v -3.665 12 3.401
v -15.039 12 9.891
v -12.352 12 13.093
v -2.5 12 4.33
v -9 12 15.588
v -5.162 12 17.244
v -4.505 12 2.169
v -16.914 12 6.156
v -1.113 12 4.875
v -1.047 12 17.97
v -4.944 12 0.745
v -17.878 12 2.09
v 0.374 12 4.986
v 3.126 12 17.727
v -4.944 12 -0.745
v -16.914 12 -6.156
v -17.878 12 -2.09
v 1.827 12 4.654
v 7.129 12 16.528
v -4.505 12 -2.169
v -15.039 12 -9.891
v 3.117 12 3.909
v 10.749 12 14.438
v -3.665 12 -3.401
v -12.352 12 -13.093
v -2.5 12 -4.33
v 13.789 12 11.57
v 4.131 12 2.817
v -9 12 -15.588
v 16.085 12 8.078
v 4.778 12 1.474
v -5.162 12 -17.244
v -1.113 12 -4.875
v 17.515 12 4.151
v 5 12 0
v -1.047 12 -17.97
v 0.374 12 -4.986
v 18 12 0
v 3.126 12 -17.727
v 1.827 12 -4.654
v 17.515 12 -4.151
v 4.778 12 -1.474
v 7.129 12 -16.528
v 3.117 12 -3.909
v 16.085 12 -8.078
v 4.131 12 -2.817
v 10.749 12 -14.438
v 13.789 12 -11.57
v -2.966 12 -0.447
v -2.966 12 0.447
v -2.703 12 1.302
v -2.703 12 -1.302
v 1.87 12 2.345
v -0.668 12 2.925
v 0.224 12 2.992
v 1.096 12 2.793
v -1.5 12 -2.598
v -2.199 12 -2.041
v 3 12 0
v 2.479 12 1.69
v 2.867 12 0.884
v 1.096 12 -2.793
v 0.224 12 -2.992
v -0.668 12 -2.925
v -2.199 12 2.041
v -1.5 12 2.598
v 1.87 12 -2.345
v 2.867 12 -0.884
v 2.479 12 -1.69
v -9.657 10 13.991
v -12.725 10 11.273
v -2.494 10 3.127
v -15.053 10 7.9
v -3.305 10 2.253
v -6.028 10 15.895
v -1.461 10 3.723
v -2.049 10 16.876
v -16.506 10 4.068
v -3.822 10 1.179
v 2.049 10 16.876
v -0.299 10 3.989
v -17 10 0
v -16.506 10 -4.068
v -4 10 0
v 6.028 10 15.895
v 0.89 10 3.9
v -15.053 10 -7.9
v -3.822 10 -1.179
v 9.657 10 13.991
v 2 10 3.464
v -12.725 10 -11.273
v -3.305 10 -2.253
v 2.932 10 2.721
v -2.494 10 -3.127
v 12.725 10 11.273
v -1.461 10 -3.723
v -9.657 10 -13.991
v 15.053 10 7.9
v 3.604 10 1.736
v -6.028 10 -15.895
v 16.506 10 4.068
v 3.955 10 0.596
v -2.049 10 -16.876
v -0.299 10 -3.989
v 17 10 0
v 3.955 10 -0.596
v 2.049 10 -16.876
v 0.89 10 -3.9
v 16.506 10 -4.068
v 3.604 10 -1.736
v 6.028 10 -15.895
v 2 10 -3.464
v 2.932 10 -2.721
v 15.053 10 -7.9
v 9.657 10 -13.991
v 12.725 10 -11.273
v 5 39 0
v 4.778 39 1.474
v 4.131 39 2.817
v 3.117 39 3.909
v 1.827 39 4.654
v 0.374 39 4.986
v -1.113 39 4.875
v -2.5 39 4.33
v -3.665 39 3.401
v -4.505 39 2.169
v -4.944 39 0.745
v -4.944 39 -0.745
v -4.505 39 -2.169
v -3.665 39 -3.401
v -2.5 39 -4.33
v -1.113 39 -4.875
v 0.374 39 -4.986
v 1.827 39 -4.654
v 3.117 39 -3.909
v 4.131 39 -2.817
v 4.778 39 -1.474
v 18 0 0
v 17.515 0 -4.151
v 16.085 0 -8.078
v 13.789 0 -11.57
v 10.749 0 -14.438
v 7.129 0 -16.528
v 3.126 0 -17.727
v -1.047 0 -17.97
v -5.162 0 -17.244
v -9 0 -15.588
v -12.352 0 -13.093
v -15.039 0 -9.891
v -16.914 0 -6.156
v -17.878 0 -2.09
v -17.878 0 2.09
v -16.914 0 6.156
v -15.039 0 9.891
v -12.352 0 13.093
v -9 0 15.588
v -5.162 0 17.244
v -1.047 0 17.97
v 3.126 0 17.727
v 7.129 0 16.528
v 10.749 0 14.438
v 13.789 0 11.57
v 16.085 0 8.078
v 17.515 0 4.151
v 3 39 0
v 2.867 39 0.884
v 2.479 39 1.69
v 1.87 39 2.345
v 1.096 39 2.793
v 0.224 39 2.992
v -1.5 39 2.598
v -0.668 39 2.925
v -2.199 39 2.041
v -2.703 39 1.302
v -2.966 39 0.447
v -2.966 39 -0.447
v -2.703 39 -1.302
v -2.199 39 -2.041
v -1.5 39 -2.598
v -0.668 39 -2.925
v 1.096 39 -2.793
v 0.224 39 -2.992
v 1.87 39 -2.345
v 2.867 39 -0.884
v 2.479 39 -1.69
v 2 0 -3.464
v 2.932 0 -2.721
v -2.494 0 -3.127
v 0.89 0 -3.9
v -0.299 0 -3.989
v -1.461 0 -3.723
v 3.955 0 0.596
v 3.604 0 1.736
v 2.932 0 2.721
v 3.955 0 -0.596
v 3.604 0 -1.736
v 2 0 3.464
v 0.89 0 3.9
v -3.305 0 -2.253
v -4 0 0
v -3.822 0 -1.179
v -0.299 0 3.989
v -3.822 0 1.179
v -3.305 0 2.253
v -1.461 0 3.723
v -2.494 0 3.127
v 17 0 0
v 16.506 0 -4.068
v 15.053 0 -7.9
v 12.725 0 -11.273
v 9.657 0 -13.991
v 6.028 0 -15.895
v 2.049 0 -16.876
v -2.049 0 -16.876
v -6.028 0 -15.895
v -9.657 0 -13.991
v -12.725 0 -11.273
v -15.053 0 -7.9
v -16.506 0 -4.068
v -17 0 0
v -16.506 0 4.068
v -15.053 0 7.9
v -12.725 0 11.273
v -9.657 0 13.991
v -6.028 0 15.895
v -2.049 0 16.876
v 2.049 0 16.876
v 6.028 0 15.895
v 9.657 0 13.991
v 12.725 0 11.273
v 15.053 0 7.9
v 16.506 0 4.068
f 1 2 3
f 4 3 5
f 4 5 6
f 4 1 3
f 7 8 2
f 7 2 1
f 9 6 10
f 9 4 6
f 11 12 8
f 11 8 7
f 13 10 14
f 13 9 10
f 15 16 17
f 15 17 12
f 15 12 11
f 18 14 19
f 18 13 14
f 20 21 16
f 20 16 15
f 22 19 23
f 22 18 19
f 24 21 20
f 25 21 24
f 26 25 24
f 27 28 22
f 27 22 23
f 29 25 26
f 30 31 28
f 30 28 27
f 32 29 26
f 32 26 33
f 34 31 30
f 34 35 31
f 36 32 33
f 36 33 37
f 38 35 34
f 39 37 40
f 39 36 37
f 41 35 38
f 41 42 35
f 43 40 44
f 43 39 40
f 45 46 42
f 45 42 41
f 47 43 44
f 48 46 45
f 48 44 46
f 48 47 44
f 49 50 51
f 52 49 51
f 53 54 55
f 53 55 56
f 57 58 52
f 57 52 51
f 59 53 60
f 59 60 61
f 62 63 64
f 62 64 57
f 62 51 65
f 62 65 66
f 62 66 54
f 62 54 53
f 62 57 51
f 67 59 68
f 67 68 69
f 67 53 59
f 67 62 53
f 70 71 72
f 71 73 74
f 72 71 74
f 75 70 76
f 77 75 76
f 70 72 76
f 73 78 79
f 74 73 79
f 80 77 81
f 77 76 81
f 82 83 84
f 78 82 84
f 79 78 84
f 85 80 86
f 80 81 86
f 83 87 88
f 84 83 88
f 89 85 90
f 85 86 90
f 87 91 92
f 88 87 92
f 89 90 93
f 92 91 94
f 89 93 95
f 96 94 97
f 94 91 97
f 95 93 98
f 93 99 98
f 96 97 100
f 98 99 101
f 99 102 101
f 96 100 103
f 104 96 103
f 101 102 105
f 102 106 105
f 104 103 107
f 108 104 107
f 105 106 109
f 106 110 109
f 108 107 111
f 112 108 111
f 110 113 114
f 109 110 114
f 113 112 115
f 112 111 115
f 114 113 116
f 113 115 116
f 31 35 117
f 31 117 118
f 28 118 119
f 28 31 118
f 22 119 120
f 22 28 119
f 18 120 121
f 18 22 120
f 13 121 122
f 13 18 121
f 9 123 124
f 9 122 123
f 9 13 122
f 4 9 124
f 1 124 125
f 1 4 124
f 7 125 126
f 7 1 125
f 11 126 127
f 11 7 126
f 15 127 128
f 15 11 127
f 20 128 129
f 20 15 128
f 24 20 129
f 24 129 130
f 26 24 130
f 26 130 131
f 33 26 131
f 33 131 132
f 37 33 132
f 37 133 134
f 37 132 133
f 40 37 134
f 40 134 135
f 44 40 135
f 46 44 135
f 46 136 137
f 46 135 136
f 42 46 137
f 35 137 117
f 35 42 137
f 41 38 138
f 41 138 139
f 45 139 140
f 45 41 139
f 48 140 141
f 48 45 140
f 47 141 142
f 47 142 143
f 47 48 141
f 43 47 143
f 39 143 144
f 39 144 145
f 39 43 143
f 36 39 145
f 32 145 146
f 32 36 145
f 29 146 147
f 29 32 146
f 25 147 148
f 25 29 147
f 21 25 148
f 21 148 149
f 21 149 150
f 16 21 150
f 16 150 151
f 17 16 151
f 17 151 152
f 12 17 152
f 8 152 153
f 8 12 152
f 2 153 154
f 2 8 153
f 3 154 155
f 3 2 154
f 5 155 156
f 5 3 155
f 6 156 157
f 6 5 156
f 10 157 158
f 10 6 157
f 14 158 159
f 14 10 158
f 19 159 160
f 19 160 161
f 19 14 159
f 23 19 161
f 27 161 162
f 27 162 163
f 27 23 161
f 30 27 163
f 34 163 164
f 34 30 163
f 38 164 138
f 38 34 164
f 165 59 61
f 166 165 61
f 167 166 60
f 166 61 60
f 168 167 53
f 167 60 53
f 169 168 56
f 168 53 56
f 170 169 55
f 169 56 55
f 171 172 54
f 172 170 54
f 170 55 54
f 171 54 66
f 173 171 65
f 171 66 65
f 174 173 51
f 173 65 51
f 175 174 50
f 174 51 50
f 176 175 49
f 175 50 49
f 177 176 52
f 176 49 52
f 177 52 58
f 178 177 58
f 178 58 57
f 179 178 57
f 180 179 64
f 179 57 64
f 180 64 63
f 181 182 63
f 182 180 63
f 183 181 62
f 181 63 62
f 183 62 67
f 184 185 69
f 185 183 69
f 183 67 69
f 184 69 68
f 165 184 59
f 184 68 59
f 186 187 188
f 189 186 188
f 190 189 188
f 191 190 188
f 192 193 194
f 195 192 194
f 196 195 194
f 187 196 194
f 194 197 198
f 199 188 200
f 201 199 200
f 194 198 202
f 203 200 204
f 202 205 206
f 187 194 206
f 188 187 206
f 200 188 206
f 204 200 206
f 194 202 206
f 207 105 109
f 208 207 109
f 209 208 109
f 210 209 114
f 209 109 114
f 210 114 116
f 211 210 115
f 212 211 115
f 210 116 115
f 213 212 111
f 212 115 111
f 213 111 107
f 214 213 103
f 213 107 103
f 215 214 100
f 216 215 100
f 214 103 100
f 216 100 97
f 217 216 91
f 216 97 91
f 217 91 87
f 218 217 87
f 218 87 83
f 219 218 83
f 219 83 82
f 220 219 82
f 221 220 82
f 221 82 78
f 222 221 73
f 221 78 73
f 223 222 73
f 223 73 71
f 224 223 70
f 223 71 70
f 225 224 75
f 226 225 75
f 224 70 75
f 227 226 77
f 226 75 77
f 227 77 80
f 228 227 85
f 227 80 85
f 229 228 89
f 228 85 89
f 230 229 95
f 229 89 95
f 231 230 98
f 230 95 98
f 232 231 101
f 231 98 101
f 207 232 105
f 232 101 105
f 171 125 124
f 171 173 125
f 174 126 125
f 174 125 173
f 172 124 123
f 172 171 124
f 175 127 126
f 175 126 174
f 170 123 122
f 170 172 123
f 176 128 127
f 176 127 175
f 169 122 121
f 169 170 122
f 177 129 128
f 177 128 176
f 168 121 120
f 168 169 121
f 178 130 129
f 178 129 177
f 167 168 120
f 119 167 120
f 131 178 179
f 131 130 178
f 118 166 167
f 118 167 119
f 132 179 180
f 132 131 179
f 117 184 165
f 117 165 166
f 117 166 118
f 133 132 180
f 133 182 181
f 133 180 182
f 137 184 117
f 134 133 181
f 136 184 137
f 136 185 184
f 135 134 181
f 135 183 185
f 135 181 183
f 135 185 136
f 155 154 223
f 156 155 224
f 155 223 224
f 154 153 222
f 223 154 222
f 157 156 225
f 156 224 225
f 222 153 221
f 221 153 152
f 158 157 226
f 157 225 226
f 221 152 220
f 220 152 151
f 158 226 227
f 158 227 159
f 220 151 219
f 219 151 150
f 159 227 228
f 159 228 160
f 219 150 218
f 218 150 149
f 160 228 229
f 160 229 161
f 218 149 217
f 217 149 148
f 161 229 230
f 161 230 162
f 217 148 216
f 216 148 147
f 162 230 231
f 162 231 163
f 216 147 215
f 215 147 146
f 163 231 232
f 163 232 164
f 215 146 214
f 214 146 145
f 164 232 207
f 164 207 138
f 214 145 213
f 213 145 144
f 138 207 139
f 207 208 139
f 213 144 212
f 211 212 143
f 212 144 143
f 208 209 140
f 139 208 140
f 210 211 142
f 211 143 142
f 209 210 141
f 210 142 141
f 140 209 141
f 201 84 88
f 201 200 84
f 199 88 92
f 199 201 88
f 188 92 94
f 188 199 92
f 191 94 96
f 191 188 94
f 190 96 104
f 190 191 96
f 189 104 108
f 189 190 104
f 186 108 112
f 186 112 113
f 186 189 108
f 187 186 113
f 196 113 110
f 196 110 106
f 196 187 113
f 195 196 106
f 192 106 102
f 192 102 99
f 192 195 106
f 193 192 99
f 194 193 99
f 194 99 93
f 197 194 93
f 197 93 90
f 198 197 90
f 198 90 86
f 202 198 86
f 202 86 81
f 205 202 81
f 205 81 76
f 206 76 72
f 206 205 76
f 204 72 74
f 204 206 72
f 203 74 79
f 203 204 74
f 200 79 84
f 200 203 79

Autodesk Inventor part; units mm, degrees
ref_plane "YZ Plane" through (0, 0, 0) normal (1, 0, 0) x (0, 1, 0)
ref_plane "XZ Plane" through (0, 0, 0) normal (0, 1, 0) x (-1, 0, 0)
ref_plane "XY Plane" through (0, 0, 0) normal (0, 0, 1) x (1, 0, 0)
sketch "Sketch1" plane through (0, 0, 0) normal (0, 1, 0) x (-1, 0, 0)
  circle A0 centre (0, 0) radius 4
  dimension "d0" = 8
extrude "Extrusion1" add sketch "Sketch1" along normal blind 12
sketch "Sketch2" plane through (0, 12, 0) normal (0, 1, 0) x (1, 0, 0)
  circle A0 centre (0, 0) radius 17
  circle A1 centre (0, 0) radius 4 projected
  circle A2 centre (0, 0) radius 18
  dimension "d3" = 34
  dimension "d4" = 36
extrude "Extrusion2" add sketch "Sketch2" against normal blind 12 contours A2
sketch "Sketch4" plane through (0, 12, 0) normal (0, 1, 0) x (1, 0, 0)
  circle A0 centre (0, 0) radius 18
extrude "Extrusion3" add sketch "Sketch4" against normal blind 2
sketch "Sketch7" plane through (0, 12, 0) normal (0, 1, 0) x (1, 0, 0)
  circle A0 centre (0, 0) radius 5
  circle A1 centre (0, 0) radius 3
  dimension "d15" = 10
  dimension "d16" = 6
extrude "Extrusion6" add sketch "Sketch7" along normal blind 27
properties part number "kumandadış"
